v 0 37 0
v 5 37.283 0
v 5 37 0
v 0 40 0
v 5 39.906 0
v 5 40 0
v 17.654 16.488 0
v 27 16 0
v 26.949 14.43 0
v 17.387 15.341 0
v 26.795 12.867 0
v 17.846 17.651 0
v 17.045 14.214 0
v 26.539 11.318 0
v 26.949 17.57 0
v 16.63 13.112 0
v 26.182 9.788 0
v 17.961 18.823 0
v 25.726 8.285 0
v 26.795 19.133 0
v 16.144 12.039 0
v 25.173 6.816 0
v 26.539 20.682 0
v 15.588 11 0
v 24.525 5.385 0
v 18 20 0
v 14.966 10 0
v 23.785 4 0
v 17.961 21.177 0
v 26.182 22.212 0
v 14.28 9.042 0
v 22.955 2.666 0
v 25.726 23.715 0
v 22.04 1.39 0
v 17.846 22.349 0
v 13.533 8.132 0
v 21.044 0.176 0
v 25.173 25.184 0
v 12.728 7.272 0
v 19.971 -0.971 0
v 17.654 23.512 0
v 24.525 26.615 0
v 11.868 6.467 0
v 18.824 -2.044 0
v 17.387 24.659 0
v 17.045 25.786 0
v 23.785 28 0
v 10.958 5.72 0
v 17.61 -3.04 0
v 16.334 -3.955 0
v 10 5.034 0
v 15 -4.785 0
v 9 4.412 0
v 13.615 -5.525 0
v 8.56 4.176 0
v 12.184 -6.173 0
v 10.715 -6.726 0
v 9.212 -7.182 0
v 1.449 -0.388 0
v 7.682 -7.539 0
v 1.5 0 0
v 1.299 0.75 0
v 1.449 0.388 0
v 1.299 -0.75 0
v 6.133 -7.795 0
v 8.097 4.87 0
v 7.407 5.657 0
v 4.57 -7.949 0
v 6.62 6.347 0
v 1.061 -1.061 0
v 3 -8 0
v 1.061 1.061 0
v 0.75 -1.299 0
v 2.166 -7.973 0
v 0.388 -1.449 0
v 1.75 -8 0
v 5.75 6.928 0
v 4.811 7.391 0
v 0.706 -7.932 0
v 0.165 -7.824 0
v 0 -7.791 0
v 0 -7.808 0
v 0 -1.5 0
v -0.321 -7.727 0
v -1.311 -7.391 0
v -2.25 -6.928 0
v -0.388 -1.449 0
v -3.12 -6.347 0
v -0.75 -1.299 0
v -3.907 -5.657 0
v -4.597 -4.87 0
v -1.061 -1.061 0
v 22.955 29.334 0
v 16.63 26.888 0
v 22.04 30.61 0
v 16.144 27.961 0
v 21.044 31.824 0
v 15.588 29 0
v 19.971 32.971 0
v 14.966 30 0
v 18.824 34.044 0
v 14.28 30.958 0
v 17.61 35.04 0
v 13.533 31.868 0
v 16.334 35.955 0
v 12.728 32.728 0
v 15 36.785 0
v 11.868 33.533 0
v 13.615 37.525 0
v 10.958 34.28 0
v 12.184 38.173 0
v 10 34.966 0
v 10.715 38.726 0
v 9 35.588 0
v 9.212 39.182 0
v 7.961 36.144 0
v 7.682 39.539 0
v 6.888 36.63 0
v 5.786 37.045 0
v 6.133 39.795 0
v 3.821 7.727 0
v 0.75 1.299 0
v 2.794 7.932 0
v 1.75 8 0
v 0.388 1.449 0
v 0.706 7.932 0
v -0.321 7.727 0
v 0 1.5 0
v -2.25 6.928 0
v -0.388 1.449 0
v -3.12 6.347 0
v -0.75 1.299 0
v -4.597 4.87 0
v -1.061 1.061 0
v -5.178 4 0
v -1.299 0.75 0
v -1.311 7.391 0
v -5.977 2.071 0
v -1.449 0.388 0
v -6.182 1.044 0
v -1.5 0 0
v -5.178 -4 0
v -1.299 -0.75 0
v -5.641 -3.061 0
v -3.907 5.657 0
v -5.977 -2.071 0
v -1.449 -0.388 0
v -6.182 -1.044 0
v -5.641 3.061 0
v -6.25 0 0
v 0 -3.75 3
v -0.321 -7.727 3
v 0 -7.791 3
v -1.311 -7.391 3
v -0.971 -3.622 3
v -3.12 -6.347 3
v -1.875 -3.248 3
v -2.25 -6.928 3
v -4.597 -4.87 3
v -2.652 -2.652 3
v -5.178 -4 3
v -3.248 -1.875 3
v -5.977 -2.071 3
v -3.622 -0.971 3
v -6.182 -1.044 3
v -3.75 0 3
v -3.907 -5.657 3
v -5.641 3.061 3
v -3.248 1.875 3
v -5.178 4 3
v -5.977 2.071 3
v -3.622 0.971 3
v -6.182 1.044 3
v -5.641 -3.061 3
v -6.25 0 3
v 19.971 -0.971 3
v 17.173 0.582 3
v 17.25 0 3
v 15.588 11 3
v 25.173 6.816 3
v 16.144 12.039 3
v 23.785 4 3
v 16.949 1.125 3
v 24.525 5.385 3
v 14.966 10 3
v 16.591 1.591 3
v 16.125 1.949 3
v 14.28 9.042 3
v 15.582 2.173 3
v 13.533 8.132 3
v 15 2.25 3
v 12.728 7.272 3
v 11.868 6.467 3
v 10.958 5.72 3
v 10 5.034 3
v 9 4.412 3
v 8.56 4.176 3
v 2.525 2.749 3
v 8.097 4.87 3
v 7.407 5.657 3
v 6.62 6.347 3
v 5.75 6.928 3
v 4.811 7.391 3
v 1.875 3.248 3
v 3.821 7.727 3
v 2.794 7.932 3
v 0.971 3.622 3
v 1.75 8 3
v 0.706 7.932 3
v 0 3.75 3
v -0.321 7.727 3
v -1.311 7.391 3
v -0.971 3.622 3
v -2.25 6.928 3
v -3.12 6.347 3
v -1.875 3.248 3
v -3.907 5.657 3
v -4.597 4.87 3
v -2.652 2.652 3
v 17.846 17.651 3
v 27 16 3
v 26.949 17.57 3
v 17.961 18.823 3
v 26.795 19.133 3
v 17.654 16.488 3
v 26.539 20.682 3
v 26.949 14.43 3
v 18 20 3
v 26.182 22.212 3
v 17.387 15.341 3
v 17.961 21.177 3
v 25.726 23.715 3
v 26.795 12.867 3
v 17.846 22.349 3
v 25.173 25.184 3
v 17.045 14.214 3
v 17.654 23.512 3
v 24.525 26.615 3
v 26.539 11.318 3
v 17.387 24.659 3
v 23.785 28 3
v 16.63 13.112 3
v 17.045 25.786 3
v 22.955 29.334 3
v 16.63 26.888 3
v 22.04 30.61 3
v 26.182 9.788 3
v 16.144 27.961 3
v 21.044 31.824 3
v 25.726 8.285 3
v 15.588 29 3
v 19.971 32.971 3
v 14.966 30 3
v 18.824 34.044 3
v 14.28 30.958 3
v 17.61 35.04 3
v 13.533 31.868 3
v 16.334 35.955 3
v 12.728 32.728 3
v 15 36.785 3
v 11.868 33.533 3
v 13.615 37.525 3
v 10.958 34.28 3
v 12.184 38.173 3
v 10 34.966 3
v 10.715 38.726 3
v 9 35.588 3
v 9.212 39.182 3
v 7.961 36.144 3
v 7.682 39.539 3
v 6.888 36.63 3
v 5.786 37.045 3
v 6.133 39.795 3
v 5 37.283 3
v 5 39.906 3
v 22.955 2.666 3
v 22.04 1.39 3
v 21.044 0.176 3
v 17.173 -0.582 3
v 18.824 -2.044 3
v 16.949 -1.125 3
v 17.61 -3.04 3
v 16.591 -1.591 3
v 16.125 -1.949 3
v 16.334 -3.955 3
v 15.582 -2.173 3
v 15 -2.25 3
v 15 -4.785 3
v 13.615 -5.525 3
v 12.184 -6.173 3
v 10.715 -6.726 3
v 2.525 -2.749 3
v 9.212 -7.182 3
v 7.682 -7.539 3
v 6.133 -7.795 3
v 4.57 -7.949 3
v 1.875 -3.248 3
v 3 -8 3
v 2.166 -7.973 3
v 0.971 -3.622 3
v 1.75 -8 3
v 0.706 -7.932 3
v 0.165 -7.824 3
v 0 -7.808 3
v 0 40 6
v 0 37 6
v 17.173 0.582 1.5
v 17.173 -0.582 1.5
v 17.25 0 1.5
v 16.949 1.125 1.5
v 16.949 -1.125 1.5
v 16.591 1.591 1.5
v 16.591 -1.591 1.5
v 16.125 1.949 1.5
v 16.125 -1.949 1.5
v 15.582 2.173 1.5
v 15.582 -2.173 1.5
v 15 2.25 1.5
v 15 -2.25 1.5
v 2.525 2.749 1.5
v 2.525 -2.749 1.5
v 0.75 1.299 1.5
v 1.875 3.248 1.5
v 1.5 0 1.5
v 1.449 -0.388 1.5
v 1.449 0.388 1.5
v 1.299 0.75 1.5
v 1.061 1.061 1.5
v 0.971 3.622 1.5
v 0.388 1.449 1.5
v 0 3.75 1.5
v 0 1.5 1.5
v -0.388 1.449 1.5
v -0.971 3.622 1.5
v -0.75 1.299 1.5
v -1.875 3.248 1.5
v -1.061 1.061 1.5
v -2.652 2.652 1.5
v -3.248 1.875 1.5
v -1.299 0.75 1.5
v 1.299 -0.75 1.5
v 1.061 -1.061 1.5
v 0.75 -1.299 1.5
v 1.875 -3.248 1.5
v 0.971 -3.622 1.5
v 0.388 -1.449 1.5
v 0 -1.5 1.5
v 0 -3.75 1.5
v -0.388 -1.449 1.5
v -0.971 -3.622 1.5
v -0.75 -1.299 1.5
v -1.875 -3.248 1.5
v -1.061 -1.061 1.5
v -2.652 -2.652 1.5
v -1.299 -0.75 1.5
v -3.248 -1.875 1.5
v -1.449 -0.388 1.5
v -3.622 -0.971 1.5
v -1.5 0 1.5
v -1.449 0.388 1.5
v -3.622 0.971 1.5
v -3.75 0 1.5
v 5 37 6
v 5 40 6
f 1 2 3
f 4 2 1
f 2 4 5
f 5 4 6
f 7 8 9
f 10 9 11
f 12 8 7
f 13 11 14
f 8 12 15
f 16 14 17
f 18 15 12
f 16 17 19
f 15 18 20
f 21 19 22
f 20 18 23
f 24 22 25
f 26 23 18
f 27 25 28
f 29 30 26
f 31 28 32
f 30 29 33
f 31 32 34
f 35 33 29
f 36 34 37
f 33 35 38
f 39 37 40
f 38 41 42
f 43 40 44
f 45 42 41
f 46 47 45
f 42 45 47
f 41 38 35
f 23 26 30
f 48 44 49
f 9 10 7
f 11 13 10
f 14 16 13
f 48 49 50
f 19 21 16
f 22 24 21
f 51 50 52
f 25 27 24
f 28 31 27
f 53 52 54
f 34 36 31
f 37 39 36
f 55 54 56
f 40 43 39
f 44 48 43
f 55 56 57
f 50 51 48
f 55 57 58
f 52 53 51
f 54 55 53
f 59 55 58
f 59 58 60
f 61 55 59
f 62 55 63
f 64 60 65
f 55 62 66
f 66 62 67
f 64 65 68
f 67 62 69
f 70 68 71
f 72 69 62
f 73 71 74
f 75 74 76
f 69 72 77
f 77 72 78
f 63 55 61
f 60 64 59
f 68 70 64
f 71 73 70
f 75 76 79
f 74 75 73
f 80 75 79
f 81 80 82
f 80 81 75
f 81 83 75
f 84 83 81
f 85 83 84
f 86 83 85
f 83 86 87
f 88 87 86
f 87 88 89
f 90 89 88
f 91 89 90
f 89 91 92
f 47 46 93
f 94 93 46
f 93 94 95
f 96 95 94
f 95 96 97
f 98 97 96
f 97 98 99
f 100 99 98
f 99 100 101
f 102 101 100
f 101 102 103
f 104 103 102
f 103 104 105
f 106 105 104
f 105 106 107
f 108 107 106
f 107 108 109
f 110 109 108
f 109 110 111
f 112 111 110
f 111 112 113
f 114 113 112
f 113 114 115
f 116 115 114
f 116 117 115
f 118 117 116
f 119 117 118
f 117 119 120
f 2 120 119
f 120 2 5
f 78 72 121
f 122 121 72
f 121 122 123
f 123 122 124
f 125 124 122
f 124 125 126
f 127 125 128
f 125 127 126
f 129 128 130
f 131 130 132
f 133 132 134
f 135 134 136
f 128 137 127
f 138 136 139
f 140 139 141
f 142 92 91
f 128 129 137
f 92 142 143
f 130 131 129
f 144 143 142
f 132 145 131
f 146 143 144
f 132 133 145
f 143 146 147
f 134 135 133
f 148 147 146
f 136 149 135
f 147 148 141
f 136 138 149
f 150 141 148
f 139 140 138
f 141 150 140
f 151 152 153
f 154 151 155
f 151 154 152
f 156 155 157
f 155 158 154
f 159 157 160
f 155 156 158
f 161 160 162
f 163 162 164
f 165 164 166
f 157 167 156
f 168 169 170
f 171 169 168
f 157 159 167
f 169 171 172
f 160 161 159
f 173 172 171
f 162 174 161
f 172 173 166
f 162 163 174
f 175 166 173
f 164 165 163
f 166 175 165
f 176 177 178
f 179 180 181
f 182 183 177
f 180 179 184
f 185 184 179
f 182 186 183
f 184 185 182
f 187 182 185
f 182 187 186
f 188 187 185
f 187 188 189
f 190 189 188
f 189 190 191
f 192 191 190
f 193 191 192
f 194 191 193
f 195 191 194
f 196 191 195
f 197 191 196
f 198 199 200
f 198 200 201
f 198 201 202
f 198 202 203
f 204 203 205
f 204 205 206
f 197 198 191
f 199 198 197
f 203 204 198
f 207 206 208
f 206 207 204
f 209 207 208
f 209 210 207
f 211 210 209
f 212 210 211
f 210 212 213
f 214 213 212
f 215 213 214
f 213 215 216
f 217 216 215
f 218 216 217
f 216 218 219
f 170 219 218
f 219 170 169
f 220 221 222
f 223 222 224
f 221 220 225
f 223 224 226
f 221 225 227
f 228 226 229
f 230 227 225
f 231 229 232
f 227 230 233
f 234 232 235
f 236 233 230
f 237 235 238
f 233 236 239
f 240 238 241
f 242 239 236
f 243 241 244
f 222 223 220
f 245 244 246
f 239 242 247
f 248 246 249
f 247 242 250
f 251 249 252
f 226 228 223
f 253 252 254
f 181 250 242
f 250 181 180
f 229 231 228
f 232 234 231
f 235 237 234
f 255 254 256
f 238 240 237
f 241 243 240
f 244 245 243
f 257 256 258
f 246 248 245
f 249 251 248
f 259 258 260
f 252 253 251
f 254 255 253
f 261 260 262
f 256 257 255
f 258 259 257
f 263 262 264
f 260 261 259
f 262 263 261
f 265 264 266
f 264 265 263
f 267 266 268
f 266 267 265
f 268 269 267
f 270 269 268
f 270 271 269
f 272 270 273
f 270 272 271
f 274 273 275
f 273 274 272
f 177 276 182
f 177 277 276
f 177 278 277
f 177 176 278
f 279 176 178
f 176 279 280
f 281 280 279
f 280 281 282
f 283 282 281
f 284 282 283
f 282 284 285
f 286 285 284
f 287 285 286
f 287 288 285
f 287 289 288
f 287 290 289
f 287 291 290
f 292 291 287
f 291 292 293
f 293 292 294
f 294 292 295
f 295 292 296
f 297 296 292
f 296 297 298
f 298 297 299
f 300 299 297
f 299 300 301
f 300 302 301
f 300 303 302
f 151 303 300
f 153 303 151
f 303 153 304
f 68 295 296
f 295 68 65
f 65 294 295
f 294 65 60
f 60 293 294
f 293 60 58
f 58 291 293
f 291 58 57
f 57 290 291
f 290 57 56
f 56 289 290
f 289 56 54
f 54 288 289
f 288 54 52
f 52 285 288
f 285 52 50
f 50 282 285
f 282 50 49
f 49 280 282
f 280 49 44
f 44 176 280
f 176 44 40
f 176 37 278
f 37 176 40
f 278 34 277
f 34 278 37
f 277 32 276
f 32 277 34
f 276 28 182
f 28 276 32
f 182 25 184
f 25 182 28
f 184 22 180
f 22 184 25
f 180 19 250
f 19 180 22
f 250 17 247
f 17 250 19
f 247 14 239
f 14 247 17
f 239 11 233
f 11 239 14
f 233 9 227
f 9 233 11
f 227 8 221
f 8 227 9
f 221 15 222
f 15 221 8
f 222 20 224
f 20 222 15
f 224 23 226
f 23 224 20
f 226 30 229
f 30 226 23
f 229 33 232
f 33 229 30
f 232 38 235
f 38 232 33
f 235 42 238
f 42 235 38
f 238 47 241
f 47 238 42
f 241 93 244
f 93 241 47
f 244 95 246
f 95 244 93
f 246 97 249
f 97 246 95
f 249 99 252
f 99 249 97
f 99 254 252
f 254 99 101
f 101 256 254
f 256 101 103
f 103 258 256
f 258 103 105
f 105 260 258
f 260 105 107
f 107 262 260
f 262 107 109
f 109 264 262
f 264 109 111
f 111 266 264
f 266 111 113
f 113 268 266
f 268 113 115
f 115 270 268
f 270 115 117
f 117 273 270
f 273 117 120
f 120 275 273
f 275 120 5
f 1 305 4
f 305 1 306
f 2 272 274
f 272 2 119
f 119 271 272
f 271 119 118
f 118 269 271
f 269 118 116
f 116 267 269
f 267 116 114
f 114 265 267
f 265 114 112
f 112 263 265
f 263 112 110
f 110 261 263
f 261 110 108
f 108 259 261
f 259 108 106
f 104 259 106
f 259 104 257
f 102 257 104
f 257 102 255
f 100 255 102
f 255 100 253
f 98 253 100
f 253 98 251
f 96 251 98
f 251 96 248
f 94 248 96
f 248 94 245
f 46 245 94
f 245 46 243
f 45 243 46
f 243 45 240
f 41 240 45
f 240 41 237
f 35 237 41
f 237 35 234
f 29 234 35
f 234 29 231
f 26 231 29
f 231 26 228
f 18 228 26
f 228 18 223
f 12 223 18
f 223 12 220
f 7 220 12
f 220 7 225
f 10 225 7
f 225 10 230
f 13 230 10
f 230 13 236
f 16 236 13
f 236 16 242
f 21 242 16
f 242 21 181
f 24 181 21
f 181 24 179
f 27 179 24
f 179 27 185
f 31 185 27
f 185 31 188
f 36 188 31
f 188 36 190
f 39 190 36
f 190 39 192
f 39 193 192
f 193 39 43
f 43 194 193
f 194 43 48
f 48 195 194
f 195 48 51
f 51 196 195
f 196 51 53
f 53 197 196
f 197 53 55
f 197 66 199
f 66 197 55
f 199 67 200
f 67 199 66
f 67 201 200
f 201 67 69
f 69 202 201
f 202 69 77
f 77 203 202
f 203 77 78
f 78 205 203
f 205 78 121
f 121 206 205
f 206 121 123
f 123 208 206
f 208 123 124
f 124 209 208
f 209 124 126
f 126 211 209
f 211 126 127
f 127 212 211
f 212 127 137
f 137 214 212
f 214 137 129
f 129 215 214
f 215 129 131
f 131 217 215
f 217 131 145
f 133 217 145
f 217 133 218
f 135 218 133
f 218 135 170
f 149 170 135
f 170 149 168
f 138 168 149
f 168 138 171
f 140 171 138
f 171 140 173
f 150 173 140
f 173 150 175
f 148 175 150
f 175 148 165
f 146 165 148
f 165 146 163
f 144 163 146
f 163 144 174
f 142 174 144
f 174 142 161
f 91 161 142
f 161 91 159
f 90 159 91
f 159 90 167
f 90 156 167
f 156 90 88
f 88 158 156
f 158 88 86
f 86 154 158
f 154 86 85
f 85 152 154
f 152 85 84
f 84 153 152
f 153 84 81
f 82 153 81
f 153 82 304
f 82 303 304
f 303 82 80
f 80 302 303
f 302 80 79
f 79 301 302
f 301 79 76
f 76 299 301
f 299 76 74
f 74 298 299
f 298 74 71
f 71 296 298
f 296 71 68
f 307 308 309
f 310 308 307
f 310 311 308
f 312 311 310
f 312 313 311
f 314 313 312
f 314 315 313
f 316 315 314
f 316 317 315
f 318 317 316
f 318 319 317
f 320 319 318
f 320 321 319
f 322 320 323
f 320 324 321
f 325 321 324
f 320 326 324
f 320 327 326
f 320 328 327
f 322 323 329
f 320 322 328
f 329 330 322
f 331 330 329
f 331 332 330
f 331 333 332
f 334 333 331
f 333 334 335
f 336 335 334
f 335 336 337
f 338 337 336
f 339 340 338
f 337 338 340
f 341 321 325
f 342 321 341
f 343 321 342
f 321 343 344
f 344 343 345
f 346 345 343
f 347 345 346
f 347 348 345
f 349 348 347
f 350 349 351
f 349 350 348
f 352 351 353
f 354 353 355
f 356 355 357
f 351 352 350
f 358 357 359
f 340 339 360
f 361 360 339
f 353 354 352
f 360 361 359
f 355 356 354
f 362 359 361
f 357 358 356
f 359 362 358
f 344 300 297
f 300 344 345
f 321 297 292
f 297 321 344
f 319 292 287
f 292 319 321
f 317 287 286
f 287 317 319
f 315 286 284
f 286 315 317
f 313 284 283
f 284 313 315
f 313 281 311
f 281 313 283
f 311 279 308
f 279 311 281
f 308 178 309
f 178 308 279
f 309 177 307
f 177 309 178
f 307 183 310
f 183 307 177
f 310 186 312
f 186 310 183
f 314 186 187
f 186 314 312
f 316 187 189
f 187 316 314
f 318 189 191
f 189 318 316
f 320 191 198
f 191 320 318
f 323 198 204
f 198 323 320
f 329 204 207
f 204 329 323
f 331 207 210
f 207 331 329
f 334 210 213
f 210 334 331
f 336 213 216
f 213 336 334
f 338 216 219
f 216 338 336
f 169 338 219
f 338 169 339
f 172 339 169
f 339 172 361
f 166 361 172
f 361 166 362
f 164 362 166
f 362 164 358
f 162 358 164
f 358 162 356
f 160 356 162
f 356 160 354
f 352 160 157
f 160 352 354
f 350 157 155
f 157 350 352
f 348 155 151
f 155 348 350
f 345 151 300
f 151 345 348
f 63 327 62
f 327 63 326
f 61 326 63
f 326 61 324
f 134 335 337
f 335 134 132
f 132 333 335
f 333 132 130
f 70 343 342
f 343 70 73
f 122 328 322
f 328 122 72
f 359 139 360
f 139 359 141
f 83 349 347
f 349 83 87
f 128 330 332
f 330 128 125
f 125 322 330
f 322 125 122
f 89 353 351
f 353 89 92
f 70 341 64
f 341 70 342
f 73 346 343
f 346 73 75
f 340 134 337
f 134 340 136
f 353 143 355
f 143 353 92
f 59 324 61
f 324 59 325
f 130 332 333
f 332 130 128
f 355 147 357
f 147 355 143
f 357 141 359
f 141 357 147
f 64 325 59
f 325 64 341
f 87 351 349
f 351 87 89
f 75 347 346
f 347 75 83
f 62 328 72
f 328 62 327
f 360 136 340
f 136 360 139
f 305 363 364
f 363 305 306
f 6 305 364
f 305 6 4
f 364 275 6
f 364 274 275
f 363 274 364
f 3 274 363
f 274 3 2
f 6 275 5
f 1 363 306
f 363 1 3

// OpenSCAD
$fn = 24;

difference() {
    linear_extrude(3) {
        translate([1.75,0,0]) circle(r=8, $fn=48);
        difference() {
            translate([3,16,0]) circle(r=24, $fn=96);
            translate([0,20,0]) circle(r=18, $fn=96);
            translate([-30,-16,0]) square([30,60]);
        }
    }

    translate([0, 0, 1.5]) {
        linear_extrude(2) {
            hull() {
                circle(r=2.85);
                translate([15, 0, 0]) circle(r=2.25);
            }
            circle(r=3.75);
        }
    }
    #cylinder(h=4, r1=1.5, r2 = 1.5);
}

 linear_extrude(6) {
    translate([0, 37, 0]) square([5,3]);
}
